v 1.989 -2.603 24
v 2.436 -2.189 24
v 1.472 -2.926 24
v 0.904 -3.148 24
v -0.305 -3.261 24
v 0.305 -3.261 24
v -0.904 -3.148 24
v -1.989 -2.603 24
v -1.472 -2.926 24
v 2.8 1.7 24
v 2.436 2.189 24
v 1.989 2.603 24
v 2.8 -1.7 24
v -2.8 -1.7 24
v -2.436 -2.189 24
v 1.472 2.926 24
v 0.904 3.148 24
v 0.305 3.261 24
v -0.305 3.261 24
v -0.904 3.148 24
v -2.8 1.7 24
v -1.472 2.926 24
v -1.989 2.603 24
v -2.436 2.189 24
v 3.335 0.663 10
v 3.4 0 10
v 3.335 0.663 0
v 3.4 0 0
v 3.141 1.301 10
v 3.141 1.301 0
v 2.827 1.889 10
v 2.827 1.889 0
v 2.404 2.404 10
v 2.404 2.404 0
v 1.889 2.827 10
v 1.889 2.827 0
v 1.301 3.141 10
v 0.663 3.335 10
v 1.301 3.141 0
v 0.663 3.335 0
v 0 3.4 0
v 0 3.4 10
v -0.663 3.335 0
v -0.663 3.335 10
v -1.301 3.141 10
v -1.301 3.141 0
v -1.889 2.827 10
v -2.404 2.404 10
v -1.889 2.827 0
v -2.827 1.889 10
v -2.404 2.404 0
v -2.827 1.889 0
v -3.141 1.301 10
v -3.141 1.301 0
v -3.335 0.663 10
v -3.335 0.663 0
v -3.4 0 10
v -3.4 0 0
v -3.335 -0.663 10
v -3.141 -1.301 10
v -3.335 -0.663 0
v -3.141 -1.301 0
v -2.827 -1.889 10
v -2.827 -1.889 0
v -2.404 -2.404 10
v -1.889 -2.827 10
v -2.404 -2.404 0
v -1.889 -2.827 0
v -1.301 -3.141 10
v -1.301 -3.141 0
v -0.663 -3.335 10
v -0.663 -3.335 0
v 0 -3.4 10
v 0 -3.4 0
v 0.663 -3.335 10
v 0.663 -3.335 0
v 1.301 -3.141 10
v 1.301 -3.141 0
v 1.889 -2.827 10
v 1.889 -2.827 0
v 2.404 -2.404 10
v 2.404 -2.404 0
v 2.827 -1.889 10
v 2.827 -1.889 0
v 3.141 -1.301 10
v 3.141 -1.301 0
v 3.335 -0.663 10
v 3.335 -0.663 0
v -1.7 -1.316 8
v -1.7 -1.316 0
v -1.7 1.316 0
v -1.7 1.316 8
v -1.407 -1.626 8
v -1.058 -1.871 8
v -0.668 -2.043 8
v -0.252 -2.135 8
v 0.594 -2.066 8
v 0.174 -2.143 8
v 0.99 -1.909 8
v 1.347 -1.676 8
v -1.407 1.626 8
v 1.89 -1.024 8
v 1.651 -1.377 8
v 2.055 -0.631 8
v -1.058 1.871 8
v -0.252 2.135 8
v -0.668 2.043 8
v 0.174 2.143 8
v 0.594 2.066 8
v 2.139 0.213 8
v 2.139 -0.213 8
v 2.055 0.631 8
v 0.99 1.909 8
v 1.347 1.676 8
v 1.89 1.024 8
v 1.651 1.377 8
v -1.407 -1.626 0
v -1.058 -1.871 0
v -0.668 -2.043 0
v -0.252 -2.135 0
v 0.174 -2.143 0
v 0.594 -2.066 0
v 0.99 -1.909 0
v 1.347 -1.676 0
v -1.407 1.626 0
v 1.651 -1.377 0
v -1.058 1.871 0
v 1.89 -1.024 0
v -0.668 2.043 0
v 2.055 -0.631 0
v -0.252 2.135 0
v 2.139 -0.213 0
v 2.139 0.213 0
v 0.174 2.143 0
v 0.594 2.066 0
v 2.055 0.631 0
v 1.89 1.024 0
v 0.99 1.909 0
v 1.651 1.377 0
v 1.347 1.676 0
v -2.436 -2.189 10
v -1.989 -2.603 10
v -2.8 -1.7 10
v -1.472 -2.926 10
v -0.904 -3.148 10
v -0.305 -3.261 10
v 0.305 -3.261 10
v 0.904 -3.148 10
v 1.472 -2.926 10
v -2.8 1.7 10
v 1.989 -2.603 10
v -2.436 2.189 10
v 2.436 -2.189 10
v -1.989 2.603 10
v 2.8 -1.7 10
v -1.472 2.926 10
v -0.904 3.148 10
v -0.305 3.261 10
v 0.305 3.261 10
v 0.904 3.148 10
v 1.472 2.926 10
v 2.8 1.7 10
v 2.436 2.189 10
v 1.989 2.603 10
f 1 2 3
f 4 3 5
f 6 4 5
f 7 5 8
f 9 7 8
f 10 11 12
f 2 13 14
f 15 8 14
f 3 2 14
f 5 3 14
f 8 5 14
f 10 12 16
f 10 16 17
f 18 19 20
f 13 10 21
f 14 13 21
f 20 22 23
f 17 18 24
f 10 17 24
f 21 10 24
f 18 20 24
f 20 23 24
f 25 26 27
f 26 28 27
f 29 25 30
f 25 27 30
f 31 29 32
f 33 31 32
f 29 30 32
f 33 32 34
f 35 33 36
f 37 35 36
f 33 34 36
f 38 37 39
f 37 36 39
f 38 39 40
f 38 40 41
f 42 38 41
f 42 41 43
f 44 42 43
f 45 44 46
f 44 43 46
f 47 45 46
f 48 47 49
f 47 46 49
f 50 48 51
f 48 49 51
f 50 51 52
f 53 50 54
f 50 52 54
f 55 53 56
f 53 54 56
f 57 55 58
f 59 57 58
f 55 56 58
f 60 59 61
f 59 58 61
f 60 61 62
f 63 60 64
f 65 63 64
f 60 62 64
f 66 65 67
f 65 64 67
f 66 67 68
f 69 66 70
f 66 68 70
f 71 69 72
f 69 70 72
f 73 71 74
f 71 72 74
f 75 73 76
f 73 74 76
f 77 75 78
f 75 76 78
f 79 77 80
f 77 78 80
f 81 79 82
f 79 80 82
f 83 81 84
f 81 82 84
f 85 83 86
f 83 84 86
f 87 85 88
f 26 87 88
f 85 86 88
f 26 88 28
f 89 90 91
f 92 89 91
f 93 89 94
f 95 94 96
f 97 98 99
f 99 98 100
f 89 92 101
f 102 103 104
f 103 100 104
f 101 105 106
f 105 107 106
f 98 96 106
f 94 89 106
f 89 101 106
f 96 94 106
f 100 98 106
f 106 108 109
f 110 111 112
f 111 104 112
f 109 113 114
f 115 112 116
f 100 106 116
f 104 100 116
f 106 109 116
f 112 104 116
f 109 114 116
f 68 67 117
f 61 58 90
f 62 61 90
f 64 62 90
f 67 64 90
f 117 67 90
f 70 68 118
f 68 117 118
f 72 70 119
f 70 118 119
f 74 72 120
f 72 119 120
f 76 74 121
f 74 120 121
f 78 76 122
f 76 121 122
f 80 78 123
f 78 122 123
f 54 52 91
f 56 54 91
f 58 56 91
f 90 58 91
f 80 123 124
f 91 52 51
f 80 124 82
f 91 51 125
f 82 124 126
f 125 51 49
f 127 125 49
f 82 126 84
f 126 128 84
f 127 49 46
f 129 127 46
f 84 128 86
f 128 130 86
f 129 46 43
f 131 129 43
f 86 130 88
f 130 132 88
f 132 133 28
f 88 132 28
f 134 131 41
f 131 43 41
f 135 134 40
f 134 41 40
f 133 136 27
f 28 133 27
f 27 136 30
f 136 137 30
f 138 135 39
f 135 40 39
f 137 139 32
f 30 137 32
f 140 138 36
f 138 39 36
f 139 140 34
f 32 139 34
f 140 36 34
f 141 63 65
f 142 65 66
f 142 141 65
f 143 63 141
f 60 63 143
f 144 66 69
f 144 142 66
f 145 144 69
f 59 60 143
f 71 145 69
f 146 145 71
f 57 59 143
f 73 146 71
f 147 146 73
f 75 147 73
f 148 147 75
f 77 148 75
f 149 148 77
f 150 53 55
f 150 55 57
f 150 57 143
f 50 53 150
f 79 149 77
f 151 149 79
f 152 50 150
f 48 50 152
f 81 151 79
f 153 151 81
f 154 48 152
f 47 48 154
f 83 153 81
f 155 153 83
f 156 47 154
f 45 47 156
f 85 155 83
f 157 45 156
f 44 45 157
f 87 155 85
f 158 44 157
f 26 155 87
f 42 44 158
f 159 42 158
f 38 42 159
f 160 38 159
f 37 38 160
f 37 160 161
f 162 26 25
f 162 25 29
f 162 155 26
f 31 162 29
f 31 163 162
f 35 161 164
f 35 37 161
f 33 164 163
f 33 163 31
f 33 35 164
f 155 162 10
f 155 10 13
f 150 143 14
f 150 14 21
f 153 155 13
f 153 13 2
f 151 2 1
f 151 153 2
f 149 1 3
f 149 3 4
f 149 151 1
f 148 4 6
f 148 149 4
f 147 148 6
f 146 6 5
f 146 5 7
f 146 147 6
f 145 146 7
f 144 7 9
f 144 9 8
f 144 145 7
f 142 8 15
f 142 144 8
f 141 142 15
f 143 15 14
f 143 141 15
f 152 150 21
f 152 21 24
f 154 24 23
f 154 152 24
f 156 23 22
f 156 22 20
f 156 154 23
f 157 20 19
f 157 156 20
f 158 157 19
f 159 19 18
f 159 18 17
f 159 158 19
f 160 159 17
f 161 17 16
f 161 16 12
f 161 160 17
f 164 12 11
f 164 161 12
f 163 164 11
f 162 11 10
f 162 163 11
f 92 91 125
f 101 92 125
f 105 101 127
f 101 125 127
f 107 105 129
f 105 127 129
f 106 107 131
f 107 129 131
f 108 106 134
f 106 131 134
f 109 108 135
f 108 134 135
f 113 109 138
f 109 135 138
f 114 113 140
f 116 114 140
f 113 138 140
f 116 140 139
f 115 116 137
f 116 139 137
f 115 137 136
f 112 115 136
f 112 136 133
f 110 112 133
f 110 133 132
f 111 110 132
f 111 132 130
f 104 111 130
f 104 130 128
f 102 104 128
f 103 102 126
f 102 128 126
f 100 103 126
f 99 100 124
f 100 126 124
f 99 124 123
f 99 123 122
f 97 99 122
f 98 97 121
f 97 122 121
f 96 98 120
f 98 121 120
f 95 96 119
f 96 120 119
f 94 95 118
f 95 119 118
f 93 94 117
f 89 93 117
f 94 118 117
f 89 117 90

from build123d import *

# Parameters (mm, degrees)
SKETCH2_R           = 3.4
BOSS_EXTRUDE1_DEPTH = 8
SKETCH3_R           = 3.4
BOSS_EXTRUDE2_DEPTH = 2
BOSS_EXTRUDE3_DEPTH = 14


with BuildPart() as part:
    # Sketch2 → Boss-Extrude1 (new body)
    with BuildSketch(Plane.XY):
        Circle(SKETCH2_R)
        with BuildLine():
            Line((-1.7, -1.316244658), (-1.7, 1.316244658))
            ThreePointArc((-1.7, 1.316244658), (2.15, 0), (-1.7, -1.316244658))
        make_face(mode=Mode.SUBTRACT)
    extrude(amount=BOSS_EXTRUDE1_DEPTH)

    # Sketch3 → Boss-Extrude2 (add)
    with BuildSketch(Plane.XY.offset(8)):
        Circle(SKETCH3_R)
    extrude(amount=BOSS_EXTRUDE2_DEPTH)

    # Sketch4 → Boss-Extrude3 (add)
    with BuildSketch(Plane.XY.offset(10)):
        with BuildLine():
            Line((-2.8, -1.7), (-2.8, 1.7))
            ThreePointArc((-2.8, 1.7), (0, 3.275667871), (2.8, 1.7))
            Line((2.8, 1.7), (2.8, -1.7))
            ThreePointArc((2.8, -1.7), (0, -3.275667871), (-2.8, -1.7))
        make_face()
    extrude(amount=BOSS_EXTRUDE3_DEPTH)


solid = part.part
